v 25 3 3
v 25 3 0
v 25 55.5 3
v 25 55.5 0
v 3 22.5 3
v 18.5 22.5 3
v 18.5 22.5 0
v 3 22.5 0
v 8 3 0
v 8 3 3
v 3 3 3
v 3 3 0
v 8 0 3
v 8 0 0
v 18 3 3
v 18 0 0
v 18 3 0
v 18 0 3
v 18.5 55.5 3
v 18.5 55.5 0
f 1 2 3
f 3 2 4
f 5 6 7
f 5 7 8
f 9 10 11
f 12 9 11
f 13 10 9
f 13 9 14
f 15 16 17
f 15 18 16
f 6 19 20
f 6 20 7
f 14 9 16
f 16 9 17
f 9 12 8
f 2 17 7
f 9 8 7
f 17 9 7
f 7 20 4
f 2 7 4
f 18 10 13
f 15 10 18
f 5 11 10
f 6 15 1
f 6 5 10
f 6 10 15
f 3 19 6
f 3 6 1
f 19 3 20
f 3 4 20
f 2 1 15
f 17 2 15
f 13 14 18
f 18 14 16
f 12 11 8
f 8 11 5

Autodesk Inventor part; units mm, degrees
ref_plane "YZ Plane" through (0, 0, 0) normal (1, 0, 0) x (0, 1, 0)
ref_plane "XZ Plane" through (0, 0, 0) normal (0, 1, 0) x (-1, 0, 0)
ref_plane "XY Plane" through (0, 0, 0) normal (0, 0, 1) x (1, 0, 0)
sketch "Sketch1" plane through (0, 0, 0) normal (0, 0, 1) x (1, 0, 0)
  line L0 (0, 0) -> (25, 0)
  line L1 (25, 0) -> (25, 55.5)
  line L2 (25, 55.5) -> (0, 55.5)
  line L3 (0, 55.5) -> (0, 0)
  dimension "d0" = 25
  dimension "d1" = 55.5
extrude "Extrusion1" add sketch "Sketch1" along normal blind 3
sketch "Sketch2" plane through (0, 0, 3) normal (0, 0, 1) x (1, 0, 0)
  line L0 (0, 55.5) -> (0, 0) projected
  line L1 (25, 55.5) -> (0, 55.5) projected
  line L2 (0, 0) -> (3, 0)
  line L3 (3, 0) -> (3, 55.5)
  line L4 (3, 55.5) -> (0, 55.5)
  line L5 (0, 55.5) -> (0, 0)
  dimension "d4" = 3
extrude "Extrusion2" cut sketch "Sketch2" against normal through all
sketch "Sketch3" plane through (0, 0, 3) normal (0, 0, 1) x (1, 0, 0)
  point P0 (0, 0)
sketch "Sketch4" plane through (0, 0, 3) normal (0, 0, 1) x (1, 0, 0)
  line L0 (25, 55.5) -> (3, 55.5) projected
  line L1 (3, 55.5) -> (18.5, 55.5)
  line L2 (18.5, 55.5) -> (18.5, 22.5)
  line L3 (18.5, 22.5) -> (3, 22.5)
  line L4 (3, 22.5) -> (3, 55.5)
  point P0 (0, 0)
  dimension "d7" = 15.5
  dimension "d8" = 33
extrude "Extrusion3" cut sketch "Sketch4" against normal through all
sketch "Sketch5" plane through (0, 0, 3) normal (0, 0, 1) x (1, 0, 0)
  line L0 (3, 0) -> (25, 0) projected
  line L1 (8, 0) -> (18, 0)
  line L2 (18, 0) -> (18, 3)
  line L3 (18, 3) -> (8, 3)
  line L4 (8, 3) -> (8, 0)
  line L5 (3, 22.5) -> (3, 0) projected
  line L6 (3, 0) -> (8, 0)
  line L7 (8, 0) -> (8, 3)
  line L8 (8, 3) -> (3, 3)
  line L9 (3, 3) -> (3, 0)
  line L10 (18, 0) -> (25, 0)
  line L11 (25, 0) -> (25, 3)
  line L12 (25, 3) -> (18, 3)
  line L13 (18, 3) -> (18, 0)
  point P0 (0, 0)
  dimension "d11" = 10
  dimension "d12" = 3
  dimension "d13" = 5
extrude "Extrusion4" cut sketch "Sketch5" against normal through all contours L5 L8 L4 L0 | L2 L12 L11 L0
properties part number "hollow_mount"
